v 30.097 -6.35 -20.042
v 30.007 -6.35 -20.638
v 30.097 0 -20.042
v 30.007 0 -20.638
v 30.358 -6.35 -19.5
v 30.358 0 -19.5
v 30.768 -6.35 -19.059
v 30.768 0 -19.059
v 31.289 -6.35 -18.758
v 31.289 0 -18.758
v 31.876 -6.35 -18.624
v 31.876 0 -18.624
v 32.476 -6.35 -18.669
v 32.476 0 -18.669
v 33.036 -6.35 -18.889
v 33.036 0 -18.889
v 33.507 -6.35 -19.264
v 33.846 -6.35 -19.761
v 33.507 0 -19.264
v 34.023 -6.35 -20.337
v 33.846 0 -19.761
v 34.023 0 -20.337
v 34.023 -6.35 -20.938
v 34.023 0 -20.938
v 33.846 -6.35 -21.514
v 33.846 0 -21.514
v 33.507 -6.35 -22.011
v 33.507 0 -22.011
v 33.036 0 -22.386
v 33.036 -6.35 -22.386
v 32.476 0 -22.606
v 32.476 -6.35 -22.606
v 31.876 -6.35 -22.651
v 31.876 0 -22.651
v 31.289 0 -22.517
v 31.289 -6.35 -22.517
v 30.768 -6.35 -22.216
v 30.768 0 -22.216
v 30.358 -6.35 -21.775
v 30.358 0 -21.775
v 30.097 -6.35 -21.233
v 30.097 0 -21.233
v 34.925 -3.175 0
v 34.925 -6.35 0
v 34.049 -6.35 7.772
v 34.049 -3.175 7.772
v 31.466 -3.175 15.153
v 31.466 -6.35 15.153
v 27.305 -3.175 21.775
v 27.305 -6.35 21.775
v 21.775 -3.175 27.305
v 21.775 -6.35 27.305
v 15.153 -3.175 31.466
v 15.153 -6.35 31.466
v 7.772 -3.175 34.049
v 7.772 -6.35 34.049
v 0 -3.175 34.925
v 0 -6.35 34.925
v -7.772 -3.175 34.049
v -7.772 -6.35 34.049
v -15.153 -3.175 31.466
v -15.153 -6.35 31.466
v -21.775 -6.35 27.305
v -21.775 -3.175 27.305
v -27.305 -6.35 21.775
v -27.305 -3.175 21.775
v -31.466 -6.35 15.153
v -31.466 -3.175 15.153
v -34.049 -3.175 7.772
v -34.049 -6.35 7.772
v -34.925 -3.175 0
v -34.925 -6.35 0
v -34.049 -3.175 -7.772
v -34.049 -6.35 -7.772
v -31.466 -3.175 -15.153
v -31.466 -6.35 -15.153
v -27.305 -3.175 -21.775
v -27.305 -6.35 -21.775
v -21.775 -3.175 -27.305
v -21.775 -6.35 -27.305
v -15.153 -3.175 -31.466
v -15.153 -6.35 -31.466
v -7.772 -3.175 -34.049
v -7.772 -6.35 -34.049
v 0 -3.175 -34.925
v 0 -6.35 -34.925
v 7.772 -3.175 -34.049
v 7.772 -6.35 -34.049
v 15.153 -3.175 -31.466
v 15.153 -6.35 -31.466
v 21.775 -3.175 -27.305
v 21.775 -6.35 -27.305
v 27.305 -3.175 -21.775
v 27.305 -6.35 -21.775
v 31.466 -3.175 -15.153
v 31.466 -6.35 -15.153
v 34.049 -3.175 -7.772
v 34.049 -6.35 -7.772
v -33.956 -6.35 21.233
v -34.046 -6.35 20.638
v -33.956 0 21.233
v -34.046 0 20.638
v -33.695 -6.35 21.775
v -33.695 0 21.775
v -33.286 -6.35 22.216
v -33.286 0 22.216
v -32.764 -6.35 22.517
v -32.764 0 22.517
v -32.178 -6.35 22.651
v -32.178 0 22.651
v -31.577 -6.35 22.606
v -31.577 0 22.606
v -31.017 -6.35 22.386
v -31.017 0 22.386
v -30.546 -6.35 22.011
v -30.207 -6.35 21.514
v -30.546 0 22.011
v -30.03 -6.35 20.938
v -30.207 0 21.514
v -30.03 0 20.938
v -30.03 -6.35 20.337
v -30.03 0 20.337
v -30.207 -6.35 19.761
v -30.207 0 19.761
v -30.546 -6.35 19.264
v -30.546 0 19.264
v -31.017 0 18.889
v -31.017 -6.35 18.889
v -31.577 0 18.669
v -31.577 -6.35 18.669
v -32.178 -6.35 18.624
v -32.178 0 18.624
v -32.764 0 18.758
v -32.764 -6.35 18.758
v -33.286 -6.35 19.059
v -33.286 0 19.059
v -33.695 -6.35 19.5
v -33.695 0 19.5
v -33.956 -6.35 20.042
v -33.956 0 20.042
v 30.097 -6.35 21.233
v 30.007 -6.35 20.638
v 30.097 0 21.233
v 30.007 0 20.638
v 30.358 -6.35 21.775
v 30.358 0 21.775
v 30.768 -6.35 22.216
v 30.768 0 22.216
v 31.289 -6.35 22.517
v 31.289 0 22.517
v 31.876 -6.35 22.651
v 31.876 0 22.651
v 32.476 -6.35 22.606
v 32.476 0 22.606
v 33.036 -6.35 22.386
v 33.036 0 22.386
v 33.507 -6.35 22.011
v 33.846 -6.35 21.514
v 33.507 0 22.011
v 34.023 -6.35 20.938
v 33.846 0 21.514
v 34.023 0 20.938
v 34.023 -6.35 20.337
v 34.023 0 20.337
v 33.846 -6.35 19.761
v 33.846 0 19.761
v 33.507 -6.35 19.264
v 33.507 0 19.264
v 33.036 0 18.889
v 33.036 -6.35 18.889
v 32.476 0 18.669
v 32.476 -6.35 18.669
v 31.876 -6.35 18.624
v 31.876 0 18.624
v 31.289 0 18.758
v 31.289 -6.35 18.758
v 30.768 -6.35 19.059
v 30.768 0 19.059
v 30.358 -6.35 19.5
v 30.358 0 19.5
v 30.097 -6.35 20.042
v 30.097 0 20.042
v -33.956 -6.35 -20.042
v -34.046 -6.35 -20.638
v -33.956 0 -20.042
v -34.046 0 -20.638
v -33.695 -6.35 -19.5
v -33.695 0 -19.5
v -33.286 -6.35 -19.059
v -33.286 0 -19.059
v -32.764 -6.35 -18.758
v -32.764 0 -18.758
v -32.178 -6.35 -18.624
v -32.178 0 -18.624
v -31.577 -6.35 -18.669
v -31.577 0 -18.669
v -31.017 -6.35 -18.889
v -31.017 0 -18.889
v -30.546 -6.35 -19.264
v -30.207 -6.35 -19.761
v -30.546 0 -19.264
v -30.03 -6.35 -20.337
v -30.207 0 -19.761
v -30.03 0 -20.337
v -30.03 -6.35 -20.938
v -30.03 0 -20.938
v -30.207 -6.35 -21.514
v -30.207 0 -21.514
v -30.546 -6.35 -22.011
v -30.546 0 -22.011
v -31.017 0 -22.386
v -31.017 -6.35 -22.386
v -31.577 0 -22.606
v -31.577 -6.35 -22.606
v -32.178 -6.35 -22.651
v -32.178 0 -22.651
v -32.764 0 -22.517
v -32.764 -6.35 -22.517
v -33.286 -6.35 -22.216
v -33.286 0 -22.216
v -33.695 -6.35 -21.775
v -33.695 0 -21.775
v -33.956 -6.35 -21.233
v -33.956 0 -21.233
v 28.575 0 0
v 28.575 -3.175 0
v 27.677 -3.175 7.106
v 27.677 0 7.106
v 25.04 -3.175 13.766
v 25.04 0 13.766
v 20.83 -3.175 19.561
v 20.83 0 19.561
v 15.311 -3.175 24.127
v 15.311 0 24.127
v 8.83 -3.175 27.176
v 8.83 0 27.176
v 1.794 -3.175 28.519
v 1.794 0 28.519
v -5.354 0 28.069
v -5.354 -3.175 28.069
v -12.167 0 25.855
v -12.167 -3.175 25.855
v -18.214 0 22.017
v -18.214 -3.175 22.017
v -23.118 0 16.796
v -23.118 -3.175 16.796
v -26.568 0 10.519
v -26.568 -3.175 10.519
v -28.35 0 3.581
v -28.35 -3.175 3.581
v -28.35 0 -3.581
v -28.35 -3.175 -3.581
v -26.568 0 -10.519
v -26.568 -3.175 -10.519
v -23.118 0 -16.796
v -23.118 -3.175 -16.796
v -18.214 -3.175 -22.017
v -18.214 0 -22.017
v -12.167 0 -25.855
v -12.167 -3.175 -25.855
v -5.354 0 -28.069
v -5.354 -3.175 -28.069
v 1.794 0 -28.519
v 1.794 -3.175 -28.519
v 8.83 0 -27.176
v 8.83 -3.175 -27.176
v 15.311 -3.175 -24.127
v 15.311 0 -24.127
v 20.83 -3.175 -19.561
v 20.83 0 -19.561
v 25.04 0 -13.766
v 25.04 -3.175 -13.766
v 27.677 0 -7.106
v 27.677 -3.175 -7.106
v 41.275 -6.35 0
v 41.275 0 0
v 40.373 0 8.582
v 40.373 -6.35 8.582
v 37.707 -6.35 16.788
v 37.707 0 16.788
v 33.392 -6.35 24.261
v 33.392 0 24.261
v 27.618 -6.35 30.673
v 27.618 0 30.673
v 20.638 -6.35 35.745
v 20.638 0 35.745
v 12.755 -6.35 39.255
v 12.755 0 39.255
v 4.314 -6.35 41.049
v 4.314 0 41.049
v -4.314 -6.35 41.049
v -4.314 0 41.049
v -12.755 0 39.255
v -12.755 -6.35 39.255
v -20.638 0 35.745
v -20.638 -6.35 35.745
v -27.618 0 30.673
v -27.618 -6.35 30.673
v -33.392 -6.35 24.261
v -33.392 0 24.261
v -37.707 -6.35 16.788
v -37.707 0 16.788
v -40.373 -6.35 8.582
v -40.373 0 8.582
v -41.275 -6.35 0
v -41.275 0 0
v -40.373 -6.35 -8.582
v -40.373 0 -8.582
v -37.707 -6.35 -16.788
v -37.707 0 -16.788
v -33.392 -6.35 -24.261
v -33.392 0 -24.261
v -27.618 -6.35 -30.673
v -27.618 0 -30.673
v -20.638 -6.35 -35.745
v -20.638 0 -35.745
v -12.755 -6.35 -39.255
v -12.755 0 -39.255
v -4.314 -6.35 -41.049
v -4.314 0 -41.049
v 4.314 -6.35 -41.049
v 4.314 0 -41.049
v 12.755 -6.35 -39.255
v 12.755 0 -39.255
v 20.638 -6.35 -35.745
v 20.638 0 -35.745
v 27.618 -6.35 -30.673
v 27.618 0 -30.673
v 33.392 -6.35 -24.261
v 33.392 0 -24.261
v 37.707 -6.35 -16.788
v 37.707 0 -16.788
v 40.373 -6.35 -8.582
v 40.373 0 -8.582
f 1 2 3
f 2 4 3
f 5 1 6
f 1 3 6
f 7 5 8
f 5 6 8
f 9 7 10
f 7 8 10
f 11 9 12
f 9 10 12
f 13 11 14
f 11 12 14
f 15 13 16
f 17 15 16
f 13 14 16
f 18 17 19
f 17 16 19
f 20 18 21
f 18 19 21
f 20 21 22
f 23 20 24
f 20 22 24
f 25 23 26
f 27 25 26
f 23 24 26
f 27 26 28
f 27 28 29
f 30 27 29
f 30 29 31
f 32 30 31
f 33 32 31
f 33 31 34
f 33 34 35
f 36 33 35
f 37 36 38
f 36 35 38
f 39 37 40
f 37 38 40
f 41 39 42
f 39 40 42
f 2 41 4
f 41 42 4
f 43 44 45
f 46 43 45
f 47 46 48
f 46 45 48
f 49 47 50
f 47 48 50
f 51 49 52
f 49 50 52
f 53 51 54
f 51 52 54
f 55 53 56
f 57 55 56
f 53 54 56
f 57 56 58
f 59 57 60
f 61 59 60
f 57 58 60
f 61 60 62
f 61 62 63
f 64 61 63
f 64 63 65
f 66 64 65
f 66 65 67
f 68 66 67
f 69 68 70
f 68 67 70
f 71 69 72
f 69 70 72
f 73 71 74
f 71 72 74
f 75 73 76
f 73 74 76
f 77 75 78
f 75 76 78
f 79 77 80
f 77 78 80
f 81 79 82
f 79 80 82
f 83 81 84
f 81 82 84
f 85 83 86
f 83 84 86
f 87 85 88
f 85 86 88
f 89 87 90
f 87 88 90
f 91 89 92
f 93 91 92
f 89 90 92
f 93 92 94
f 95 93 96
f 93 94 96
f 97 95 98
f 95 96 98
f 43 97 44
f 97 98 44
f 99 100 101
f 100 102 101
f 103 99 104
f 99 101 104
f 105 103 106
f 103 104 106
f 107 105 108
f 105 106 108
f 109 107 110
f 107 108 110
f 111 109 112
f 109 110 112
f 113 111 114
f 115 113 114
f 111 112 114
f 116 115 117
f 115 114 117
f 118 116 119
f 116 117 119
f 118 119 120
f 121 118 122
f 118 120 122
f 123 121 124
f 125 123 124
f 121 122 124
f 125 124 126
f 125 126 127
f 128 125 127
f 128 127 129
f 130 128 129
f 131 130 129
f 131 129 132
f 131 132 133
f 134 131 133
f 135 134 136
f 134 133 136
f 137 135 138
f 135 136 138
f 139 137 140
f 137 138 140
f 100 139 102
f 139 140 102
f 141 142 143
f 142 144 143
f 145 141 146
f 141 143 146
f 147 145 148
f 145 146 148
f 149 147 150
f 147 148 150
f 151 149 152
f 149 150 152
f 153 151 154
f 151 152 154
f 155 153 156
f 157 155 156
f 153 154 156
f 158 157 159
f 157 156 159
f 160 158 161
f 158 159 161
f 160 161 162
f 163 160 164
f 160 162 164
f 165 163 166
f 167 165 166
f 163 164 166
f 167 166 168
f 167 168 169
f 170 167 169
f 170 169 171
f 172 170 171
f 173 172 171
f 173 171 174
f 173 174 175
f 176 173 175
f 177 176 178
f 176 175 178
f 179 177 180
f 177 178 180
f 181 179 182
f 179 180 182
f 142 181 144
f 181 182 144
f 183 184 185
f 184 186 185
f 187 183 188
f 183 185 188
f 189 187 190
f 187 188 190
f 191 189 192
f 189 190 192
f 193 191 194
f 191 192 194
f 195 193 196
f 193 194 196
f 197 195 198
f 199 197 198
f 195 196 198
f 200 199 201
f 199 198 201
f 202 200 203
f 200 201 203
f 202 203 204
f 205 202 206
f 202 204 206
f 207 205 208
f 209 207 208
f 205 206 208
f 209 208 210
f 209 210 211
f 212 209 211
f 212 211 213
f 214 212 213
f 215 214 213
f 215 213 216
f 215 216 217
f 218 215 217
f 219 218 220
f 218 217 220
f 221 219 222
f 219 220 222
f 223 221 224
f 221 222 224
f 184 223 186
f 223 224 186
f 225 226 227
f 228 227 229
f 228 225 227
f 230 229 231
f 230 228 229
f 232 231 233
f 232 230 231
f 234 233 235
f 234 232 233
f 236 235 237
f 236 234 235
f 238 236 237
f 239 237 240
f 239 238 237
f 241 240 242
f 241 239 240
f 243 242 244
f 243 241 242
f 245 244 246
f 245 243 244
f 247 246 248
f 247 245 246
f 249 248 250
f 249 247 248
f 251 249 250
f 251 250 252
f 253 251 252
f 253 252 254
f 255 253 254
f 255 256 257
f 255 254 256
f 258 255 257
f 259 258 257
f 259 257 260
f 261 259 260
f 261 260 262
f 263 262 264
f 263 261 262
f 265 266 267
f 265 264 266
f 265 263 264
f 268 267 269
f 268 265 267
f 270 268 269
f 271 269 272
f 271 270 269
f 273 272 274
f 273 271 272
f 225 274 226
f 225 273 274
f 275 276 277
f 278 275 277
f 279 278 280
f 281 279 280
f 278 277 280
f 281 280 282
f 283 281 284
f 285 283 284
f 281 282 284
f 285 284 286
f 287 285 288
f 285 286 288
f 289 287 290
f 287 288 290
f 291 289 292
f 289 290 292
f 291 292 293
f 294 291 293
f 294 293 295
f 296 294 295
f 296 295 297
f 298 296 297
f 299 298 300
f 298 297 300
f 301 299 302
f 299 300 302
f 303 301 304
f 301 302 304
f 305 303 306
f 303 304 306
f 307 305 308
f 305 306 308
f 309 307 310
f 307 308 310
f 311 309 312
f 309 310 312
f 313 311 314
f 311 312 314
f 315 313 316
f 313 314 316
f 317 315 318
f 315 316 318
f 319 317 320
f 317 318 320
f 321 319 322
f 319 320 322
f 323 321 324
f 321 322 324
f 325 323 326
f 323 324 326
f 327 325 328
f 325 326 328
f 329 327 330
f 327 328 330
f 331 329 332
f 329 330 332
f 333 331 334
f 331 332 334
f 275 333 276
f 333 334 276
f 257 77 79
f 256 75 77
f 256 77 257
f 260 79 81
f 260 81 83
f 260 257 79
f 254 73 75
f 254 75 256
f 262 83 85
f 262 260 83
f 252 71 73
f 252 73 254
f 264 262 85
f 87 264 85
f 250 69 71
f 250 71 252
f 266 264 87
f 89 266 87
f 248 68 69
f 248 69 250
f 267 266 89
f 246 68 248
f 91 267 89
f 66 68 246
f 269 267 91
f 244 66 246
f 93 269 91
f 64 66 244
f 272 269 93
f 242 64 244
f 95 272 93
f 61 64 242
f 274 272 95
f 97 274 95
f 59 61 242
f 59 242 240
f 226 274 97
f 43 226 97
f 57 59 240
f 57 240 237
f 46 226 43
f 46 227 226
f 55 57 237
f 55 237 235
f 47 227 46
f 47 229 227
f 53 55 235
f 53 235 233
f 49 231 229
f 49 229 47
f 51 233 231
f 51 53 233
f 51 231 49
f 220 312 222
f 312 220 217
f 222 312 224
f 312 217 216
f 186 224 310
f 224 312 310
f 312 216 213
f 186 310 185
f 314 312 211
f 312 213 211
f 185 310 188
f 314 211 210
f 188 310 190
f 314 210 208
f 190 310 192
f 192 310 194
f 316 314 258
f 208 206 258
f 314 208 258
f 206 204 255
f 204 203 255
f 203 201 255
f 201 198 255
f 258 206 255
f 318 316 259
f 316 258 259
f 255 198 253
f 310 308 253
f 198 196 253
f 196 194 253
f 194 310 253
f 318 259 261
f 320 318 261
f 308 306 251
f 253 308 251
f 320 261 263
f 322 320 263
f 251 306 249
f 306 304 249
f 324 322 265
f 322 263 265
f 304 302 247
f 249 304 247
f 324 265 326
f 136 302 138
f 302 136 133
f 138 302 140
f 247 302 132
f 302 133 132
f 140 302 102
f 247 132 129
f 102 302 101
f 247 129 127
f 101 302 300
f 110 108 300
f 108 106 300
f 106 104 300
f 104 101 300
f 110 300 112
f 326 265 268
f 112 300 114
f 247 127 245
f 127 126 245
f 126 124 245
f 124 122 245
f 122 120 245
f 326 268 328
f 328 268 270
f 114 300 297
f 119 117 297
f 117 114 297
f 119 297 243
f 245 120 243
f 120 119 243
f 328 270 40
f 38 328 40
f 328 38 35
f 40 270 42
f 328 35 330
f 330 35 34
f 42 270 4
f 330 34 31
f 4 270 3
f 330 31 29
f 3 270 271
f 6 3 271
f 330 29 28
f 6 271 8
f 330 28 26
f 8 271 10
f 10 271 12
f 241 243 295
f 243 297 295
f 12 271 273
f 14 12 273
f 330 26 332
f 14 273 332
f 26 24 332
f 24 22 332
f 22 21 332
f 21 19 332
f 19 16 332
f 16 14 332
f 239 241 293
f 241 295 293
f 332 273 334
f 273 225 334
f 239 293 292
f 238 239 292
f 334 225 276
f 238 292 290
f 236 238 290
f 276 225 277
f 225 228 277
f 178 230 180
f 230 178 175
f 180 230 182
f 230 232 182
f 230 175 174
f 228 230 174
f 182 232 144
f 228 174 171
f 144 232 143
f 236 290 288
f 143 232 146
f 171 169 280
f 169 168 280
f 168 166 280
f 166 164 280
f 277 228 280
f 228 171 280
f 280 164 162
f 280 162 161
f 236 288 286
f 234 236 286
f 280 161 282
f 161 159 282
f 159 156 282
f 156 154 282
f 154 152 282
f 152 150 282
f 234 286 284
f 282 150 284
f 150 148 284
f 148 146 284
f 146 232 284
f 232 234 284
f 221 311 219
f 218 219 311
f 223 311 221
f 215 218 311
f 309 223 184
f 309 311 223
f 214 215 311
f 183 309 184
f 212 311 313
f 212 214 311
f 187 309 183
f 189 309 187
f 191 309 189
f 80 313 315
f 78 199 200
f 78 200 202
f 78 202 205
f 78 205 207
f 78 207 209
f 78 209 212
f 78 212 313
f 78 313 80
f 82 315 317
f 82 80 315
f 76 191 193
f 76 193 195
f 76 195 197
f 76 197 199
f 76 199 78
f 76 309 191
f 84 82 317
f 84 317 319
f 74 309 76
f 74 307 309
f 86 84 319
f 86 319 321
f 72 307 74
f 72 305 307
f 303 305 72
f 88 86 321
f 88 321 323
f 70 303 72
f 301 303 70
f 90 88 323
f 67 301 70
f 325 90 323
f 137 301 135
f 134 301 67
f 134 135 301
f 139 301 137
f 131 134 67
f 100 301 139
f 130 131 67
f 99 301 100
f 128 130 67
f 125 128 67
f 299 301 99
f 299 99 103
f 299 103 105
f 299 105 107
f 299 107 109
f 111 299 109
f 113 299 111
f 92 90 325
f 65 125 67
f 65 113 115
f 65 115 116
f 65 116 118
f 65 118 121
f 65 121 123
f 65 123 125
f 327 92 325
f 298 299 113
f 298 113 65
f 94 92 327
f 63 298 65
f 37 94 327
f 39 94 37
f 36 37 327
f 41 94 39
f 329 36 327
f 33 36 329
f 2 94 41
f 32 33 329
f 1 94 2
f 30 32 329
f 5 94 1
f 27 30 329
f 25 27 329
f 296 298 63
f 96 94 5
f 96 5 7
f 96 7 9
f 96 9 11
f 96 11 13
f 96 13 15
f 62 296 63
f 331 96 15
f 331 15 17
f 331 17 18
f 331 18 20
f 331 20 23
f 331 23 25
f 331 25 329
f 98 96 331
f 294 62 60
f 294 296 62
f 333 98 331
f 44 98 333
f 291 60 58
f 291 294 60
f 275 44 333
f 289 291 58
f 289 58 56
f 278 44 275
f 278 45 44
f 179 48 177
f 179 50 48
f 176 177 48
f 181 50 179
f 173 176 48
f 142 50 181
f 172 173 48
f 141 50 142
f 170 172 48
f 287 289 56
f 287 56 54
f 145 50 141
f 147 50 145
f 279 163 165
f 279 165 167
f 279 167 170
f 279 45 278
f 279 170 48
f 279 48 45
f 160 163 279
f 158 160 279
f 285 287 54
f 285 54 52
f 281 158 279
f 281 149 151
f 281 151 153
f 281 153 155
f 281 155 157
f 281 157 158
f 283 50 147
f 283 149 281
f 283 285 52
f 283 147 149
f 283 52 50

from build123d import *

# Parameters (mm, degrees)
F0_R     = 41.275
F0_R_2   = 28.575
F1_DEPTH = 6.35
F2_R     = 34.925
F3_DEPTH = 3.175
F5_D     = 4.0386
F5_DEPTH = 6.35
F5_TIP   = 1.213317848


with BuildPart() as f1:
    # F0 (on Front) → F1 (new body)
    with BuildSketch(Plane.XZ):
        Circle(F0_R)
        Circle(F0_R_2, mode=Mode.SUBTRACT)
    extrude(amount=F1_DEPTH)

    # F2 (on face) → F3 (cut)
    with BuildSketch(Plane.XZ.offset(6.35)):
        Circle(F2_R)
    extrude(amount=-F3_DEPTH, mode=Mode.SUBTRACT)

    # F5
    with Locations(Plane.XZ.offset(6.35)):
        with Locations((-32.0266075904, 20.6375), (32.0266075904, 20.6375), (32.0266075904, -20.6375), (-32.0266075904, -20.6375)):
            Hole(F5_D / 2, depth=F5_DEPTH)
            with Locations((0, 0, -(F5_DEPTH + F5_TIP / 2))):  # 118° drill point
                Cone(0, F5_D / 2, F5_TIP, mode=Mode.SUBTRACT)


solid = f1.part
